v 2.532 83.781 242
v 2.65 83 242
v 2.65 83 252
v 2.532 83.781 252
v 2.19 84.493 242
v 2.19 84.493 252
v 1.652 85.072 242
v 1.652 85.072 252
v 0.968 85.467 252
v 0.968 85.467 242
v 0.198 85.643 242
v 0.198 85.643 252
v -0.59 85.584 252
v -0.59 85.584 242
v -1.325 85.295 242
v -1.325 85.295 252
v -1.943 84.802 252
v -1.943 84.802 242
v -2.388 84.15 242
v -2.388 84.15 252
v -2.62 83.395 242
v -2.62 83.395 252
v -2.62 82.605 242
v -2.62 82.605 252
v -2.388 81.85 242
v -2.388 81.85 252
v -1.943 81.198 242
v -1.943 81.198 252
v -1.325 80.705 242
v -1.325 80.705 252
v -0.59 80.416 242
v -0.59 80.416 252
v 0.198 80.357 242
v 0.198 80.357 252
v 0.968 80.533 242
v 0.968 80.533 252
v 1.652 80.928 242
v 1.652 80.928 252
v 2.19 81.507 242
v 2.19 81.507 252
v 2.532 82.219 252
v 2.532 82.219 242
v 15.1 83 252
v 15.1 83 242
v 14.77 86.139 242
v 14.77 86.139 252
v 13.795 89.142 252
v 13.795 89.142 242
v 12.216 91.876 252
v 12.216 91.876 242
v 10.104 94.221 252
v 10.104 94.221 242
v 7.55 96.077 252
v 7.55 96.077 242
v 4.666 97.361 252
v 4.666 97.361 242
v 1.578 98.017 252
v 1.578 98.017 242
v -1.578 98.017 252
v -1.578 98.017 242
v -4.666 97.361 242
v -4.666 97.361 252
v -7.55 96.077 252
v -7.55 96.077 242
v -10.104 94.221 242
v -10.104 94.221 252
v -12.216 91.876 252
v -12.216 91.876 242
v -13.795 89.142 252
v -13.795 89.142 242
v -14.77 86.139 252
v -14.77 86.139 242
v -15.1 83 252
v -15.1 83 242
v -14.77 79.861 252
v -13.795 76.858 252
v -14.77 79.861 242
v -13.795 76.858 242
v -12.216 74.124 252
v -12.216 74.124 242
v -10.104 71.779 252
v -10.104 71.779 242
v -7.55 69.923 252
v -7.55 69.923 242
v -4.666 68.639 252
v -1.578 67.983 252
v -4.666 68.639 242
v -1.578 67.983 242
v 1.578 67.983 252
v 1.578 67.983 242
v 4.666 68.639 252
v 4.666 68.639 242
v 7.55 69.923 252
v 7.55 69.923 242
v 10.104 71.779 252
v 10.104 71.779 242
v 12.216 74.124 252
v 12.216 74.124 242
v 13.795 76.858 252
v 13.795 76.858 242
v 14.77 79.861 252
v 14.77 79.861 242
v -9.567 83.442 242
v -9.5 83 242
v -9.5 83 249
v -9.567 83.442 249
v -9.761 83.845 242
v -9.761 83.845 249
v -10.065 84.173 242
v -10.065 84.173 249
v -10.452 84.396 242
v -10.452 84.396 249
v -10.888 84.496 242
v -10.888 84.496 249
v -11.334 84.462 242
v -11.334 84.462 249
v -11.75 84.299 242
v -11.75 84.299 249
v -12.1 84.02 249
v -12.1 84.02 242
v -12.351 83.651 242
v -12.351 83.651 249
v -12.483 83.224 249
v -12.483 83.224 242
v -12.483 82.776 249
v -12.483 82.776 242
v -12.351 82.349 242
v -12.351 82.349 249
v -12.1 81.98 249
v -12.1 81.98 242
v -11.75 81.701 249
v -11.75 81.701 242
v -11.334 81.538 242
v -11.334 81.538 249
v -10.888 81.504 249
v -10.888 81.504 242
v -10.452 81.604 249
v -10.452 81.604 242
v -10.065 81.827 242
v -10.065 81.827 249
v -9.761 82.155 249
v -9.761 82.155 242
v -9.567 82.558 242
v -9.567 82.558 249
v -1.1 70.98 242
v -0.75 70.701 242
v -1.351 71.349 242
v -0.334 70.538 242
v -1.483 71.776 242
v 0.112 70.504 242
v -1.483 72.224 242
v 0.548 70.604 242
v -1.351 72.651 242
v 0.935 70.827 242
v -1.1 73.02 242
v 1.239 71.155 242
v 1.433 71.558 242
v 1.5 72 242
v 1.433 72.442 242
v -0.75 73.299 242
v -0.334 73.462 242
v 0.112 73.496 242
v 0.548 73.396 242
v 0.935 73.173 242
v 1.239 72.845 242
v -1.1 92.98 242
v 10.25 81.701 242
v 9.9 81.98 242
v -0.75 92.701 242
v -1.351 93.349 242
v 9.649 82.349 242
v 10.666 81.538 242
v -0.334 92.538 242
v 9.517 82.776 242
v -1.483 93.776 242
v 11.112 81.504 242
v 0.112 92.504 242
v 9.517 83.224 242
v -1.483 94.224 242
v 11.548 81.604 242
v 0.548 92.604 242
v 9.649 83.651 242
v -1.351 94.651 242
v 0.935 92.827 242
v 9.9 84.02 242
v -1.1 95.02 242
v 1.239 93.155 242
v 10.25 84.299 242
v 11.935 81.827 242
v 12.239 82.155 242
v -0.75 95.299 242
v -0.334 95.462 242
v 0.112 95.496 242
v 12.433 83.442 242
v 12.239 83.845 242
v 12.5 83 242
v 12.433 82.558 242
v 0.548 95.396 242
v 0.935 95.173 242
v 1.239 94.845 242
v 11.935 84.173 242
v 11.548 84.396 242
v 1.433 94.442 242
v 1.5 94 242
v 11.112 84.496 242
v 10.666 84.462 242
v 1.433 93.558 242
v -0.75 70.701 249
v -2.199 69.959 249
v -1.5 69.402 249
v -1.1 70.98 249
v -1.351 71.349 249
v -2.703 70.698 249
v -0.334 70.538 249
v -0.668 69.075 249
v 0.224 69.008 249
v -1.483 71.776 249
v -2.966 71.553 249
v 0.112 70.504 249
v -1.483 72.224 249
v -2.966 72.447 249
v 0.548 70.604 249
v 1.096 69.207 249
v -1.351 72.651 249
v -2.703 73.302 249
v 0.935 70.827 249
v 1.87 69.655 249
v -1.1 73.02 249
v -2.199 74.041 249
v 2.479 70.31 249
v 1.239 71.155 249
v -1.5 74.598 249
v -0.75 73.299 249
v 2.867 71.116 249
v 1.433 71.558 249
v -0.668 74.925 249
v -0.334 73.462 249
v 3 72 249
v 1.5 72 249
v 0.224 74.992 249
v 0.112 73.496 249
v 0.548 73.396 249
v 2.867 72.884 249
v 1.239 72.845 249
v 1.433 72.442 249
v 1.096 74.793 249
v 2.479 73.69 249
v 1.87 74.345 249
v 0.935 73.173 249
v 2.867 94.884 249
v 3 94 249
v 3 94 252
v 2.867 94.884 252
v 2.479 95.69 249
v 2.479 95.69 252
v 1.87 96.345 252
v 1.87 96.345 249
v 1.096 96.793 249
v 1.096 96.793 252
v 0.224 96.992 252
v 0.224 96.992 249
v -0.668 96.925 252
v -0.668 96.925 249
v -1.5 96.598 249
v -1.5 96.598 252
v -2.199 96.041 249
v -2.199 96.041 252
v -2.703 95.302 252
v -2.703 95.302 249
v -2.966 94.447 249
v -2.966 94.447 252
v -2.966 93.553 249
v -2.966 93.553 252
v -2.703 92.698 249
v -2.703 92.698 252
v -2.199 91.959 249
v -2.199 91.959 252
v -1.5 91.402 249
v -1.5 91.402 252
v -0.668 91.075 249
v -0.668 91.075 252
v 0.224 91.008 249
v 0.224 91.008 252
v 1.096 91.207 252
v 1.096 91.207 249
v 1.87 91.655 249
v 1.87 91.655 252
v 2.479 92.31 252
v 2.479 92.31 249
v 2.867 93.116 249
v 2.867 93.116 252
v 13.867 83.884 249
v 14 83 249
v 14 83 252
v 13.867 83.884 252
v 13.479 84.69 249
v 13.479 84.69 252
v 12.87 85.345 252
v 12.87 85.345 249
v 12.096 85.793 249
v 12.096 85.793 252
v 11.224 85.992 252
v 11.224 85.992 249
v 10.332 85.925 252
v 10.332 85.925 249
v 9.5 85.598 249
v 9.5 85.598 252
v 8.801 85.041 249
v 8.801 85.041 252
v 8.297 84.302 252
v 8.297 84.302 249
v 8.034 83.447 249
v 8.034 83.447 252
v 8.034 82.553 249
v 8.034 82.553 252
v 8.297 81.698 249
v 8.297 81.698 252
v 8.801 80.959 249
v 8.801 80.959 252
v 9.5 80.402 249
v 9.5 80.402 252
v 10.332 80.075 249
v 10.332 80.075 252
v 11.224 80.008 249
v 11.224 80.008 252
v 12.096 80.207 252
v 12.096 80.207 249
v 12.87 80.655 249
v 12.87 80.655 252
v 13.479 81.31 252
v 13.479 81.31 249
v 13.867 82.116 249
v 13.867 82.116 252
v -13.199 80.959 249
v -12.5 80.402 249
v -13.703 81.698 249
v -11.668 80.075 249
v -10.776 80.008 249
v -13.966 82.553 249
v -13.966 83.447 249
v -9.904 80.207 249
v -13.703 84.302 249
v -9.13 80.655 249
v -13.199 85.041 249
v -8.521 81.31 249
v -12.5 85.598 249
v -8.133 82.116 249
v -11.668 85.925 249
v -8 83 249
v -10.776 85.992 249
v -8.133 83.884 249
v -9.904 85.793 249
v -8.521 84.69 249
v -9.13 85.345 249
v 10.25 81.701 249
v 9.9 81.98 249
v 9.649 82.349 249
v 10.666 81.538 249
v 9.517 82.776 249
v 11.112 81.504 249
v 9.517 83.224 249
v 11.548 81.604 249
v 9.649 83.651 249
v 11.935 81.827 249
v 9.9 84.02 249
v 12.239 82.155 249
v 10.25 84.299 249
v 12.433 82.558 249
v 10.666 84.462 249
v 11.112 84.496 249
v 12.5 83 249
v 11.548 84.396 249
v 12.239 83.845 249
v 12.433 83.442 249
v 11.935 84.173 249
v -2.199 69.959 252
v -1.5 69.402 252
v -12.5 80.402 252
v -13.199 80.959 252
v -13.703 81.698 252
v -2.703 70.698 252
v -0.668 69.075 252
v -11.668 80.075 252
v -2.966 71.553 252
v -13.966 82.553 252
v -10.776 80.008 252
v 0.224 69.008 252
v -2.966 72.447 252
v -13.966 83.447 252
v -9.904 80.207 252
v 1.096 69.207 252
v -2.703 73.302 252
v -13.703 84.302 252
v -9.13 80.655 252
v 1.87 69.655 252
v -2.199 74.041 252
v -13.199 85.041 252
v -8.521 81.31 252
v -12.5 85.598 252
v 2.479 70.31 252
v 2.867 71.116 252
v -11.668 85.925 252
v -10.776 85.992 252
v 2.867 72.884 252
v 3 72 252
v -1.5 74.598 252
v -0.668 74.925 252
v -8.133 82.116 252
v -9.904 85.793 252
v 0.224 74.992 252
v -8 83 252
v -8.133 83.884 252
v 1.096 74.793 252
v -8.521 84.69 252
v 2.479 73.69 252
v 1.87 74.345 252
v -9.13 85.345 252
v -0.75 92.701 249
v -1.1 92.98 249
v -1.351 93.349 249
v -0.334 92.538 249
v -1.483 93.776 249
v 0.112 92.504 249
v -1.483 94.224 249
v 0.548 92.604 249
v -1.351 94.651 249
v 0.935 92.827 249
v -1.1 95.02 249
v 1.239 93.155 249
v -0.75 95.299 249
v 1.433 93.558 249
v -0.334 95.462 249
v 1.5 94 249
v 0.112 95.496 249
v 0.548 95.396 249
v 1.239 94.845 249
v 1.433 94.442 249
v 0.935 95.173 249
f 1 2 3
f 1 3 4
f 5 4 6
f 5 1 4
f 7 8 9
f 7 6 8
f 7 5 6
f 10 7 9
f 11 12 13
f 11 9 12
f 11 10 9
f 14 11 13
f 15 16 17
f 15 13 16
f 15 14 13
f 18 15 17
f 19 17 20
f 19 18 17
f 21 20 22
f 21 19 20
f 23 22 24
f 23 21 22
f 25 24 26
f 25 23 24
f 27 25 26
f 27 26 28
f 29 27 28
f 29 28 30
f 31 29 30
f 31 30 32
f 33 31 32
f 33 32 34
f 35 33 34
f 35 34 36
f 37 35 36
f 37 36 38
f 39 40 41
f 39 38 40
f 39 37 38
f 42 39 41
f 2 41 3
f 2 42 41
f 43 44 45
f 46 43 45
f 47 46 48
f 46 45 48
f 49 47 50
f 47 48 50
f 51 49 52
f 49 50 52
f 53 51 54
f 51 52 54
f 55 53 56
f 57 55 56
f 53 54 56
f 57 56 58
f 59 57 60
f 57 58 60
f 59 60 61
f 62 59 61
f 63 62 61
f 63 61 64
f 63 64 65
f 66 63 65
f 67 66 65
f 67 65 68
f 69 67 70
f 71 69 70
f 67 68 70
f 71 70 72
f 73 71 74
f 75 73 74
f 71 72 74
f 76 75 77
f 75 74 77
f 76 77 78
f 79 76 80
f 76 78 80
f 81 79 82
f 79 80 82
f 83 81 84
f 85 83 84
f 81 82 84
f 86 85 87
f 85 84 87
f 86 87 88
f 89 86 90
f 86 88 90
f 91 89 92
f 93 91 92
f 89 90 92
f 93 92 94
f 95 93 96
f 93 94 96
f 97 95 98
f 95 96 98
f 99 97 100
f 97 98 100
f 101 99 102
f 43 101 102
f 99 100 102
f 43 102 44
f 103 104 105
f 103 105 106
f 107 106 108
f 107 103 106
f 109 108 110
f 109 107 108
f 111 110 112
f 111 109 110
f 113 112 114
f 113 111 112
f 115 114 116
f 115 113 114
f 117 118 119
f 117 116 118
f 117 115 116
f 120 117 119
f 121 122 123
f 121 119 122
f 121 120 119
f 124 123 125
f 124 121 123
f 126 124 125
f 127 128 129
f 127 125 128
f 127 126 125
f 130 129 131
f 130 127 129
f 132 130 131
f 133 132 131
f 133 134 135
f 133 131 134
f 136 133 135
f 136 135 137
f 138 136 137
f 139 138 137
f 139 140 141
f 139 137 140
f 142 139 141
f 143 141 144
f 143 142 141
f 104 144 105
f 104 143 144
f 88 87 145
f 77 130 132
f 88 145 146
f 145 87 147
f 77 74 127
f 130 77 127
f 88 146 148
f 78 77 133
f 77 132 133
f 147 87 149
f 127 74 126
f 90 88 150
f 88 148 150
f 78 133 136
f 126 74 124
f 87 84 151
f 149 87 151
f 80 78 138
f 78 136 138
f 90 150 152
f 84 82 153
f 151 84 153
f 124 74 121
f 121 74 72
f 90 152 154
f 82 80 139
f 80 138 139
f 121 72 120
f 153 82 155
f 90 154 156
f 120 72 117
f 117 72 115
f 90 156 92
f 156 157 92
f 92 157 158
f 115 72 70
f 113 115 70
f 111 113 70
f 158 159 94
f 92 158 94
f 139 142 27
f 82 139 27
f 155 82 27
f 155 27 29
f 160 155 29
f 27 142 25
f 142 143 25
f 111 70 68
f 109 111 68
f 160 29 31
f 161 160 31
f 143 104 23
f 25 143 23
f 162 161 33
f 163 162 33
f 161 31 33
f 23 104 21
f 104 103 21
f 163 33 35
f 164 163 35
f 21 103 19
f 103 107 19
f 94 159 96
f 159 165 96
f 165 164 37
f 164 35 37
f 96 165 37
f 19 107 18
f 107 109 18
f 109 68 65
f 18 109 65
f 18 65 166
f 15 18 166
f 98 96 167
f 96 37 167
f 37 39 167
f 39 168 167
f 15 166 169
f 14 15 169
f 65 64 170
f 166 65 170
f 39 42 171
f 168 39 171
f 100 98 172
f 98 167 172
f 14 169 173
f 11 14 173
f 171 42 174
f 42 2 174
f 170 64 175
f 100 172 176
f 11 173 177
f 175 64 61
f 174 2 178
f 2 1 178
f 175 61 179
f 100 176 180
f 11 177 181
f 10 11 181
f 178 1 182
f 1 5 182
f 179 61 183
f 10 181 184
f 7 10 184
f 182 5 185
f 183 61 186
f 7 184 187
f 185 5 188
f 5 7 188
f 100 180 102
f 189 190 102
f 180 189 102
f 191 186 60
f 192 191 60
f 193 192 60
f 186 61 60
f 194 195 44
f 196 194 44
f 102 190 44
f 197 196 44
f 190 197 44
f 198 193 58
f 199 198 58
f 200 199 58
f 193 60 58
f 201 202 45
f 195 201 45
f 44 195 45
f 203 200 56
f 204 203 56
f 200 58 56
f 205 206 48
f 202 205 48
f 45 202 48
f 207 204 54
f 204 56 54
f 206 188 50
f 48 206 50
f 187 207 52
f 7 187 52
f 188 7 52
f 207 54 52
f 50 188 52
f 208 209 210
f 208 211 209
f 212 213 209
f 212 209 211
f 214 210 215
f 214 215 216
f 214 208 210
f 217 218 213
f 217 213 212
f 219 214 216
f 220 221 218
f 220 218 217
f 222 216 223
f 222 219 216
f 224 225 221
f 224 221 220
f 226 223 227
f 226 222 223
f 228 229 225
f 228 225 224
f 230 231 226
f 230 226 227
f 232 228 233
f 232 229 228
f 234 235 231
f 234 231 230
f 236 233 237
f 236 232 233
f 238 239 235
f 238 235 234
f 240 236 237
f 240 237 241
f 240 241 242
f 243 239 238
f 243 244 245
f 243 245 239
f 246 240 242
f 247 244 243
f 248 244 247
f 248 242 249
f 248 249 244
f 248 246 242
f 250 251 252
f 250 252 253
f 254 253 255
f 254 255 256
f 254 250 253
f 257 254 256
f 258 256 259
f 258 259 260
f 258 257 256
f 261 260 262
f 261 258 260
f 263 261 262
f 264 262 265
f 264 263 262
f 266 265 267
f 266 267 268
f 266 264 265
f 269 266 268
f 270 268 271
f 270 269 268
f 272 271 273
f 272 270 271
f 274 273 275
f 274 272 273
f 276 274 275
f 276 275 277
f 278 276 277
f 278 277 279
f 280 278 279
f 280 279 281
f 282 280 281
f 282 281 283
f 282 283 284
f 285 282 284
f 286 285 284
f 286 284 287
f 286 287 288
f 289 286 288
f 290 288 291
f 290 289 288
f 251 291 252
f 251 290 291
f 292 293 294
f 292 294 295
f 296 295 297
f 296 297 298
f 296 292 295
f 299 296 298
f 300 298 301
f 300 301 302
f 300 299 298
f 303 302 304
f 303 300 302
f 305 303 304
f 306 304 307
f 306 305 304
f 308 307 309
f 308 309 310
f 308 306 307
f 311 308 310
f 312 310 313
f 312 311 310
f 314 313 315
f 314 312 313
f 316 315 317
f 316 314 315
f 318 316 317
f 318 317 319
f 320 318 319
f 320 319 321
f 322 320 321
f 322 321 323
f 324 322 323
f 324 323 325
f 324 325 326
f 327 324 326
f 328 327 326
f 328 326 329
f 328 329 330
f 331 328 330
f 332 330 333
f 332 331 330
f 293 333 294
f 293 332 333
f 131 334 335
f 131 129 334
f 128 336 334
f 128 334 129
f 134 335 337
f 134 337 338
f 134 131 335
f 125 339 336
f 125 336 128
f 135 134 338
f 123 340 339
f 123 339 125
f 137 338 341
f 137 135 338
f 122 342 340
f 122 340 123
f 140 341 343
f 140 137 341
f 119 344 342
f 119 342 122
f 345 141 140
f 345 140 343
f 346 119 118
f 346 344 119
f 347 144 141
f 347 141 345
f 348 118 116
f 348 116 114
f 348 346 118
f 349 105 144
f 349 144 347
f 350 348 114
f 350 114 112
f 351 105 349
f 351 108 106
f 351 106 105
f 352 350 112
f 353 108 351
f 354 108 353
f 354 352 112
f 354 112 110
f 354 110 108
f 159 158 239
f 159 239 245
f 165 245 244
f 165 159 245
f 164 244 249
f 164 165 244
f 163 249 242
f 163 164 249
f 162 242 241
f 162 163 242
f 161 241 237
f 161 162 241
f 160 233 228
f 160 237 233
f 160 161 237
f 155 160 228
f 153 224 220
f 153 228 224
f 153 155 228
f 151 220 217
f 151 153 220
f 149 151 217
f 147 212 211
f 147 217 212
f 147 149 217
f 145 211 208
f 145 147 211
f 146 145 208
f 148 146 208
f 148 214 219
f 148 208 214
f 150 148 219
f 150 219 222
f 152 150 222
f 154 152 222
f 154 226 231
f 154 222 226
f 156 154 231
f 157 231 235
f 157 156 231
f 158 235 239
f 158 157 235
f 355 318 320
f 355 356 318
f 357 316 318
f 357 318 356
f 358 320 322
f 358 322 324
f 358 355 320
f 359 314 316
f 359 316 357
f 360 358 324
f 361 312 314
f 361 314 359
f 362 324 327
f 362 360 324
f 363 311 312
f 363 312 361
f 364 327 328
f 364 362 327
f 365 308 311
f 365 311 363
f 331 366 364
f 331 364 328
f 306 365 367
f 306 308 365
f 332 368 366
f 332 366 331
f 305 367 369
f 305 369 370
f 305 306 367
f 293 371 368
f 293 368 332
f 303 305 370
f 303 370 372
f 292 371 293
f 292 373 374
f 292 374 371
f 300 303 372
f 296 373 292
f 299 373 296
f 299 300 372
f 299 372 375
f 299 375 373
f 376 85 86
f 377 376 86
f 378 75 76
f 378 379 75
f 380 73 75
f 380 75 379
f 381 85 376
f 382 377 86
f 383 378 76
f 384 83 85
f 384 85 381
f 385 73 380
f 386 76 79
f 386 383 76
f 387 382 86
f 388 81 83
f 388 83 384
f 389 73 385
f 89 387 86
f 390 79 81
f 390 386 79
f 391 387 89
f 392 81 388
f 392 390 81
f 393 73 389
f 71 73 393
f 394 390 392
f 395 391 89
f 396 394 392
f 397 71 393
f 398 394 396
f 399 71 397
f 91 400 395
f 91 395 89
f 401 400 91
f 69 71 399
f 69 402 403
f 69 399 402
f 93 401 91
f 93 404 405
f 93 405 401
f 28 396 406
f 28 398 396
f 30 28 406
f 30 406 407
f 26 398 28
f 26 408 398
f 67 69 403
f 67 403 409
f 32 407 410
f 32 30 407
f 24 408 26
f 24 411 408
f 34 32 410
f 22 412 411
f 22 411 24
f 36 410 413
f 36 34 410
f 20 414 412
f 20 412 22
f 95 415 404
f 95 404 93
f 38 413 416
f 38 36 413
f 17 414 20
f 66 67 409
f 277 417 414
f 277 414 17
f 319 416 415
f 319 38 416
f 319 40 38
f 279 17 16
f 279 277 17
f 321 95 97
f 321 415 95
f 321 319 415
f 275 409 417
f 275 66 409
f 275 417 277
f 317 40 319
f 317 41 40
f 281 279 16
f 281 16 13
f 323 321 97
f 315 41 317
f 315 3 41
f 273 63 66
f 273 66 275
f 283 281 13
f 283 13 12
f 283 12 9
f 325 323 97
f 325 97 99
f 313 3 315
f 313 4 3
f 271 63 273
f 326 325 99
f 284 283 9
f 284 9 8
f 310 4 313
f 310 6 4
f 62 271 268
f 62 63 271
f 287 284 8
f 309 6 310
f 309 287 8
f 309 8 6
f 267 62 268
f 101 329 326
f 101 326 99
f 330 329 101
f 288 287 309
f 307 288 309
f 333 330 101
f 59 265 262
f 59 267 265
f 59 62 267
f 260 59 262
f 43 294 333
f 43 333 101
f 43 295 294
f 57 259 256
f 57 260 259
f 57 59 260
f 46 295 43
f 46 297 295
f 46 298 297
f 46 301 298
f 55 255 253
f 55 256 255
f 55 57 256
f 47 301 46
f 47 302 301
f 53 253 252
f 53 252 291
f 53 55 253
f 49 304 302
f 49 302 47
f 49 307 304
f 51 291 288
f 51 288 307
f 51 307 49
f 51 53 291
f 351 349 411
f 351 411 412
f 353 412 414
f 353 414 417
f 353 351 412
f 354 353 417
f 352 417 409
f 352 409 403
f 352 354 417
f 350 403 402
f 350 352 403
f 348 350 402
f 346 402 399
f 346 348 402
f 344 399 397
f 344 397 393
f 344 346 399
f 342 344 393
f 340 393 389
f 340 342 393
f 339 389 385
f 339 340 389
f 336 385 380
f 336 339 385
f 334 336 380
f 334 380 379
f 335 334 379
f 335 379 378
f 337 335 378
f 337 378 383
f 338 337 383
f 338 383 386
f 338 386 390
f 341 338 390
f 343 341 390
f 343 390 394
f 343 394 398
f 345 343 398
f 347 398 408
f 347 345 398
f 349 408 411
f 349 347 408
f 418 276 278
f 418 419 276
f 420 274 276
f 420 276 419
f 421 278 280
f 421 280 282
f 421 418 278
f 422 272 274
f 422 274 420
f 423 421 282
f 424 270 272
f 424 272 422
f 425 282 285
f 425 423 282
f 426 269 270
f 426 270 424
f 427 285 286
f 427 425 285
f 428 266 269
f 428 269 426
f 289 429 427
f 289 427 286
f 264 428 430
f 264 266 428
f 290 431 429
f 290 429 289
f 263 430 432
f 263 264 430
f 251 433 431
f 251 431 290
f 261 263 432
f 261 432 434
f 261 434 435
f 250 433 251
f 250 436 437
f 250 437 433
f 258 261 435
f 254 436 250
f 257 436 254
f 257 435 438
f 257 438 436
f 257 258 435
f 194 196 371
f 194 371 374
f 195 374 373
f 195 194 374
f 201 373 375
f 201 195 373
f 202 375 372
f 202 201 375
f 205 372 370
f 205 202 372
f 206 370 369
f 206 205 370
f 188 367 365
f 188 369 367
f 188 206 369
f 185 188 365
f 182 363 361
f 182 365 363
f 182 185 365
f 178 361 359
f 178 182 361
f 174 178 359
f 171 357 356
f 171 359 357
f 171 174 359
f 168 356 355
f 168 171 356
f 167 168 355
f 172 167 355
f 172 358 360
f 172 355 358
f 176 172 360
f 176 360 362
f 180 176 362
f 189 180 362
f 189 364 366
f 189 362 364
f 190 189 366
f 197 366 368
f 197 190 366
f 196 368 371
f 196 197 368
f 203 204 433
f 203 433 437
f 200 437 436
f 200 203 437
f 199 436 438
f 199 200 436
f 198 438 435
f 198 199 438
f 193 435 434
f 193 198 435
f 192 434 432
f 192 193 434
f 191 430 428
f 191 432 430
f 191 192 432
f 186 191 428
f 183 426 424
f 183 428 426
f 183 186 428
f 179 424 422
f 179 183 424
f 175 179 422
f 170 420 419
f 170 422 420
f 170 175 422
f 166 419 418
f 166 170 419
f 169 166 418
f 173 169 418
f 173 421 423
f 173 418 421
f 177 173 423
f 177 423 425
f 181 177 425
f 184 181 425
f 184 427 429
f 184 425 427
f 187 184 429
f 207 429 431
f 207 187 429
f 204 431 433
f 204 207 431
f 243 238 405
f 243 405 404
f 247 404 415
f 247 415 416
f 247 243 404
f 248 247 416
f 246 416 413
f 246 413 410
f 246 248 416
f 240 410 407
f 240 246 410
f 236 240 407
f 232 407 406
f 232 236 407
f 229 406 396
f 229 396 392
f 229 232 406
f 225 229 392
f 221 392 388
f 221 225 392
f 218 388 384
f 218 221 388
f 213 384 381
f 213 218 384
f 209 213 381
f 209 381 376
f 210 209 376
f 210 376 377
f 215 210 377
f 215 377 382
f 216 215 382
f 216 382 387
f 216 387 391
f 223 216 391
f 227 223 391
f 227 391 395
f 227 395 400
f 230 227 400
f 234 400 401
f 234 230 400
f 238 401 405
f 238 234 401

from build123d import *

# Parameters (mm, degrees)
CYLINDER672_R     = 2.65
CYLINDER672_DEPTH = 30
CYLINDER664_R     = 3
CYLINDER664_DEPTH = 3
CYLINDER661_R     = 3
CYLINDER661_DEPTH = 3
CYLINDER668_R     = 3
CYLINDER668_DEPTH = 3
CYLINDER666_R     = 3
CYLINDER666_DEPTH = 3
CYLINDER673_R     = 1.5
CYLINDER673_DEPTH = 30
CYLINDER658_R     = 1.5
CYLINDER658_DEPTH = 30
CYLINDER671_R     = 1.5
CYLINDER671_DEPTH = 30
CYLINDER667_R     = 1.5
CYLINDER667_DEPTH = 30
CYLINDER665_R     = 15.1
CYLINDER665_DEPTH = 10


with BuildPart() as v_lec672:
    # Cylinder672 → Cylinder672 (new body)
    with BuildSketch(Plane(origin=(0, 83, 232), x_dir=(1, 0, 0), z_dir=(0, 0, 1))):
        Circle(CYLINDER672_R)
    extrude(amount=CYLINDER672_DEPTH)


with BuildPart() as v_lec664:
    # Cylinder664 → Cylinder664 (new body)
    with BuildSketch(Plane(origin=(11, 83, 232), x_dir=(1, 0, 0), z_dir=(0, 0, 1))):
        Circle(CYLINDER664_R)
    extrude(amount=CYLINDER664_DEPTH)


with BuildPart() as v_lec661:
    # Cylinder661 → Cylinder661 (new body)
    with BuildSketch(Plane(origin=(0, 72, 232), x_dir=(1, 0, 0), z_dir=(0, 0, 1))):
        Circle(CYLINDER661_R)
    extrude(amount=CYLINDER661_DEPTH)


with BuildPart() as v_lec668:
    # Cylinder668 → Cylinder668 (new body)
    with BuildSketch(Plane(origin=(0, 94, 232), x_dir=(1, 0, 0), z_dir=(0, 0, 1))):
        Circle(CYLINDER668_R)
    extrude(amount=CYLINDER668_DEPTH)


with BuildPart() as compound362:
    # Cylinder666 → Cylinder666 (new body)
    with BuildSketch(Plane(origin=(-11, 83, 232), x_dir=(1, 0, 0), z_dir=(0, 0, 1))):
        Circle(CYLINDER666_R)
    extrude(amount=CYLINDER666_DEPTH)

    # Compound362: union Válec664, Válec661, Válec668
    add(v_lec664.part)
    add(v_lec661.part)
    add(v_lec668.part)


with BuildPart() as compound362_1:
    # Compound362 placement: moved
    add(compound362.part.moved(Location((0, 0, 17))))


with BuildPart() as v_lec673:
    # Cylinder673 → Cylinder673 (new body)
    with BuildSketch(Plane(origin=(11, 83, 232), x_dir=(1, 0, 0), z_dir=(0, 0, 1))):
        Circle(CYLINDER673_R)
    extrude(amount=CYLINDER673_DEPTH)


with BuildPart() as v_lec658:
    # Cylinder658 → Cylinder658 (new body)
    with BuildSketch(Plane(origin=(0, 72, 232), x_dir=(1, 0, 0), z_dir=(0, 0, 1))):
        Circle(CYLINDER658_R)
    extrude(amount=CYLINDER658_DEPTH)


with BuildPart() as v_lec671:
    # Cylinder671 → Cylinder671 (new body)
    with BuildSketch(Plane(origin=(0, 94, 232), x_dir=(1, 0, 0), z_dir=(0, 0, 1))):
        Circle(CYLINDER671_R)
    extrude(amount=CYLINDER671_DEPTH)


with BuildPart() as compound361:
    # Cylinder667 → Cylinder667 (new body)
    with BuildSketch(Plane(origin=(-11, 83, 232), x_dir=(1, 0, 0), z_dir=(0, 0, 1))):
        Circle(CYLINDER667_R)
    extrude(amount=CYLINDER667_DEPTH)

    # Compound361: union Válec673, Válec658, Válec671
    add(v_lec673.part)
    add(v_lec658.part)
    add(v_lec671.part)


with BuildPart() as cut267:
    # Cylinder665 → Cylinder665 (new body)
    with BuildSketch(Plane(origin=(0, 83, 242), x_dir=(1, 0, 0), z_dir=(0, 0, 1))):
        Circle(CYLINDER665_R)
    extrude(amount=CYLINDER665_DEPTH)

    # Cut269: cut Compound361
    add(compound361.part, mode=Mode.SUBTRACT)

    # Cut270: cut Compound362
    add(compound362_1.part, mode=Mode.SUBTRACT)

    # Cut267: cut Válec672
    add(v_lec672.part, mode=Mode.SUBTRACT)


solid = cut267.part
